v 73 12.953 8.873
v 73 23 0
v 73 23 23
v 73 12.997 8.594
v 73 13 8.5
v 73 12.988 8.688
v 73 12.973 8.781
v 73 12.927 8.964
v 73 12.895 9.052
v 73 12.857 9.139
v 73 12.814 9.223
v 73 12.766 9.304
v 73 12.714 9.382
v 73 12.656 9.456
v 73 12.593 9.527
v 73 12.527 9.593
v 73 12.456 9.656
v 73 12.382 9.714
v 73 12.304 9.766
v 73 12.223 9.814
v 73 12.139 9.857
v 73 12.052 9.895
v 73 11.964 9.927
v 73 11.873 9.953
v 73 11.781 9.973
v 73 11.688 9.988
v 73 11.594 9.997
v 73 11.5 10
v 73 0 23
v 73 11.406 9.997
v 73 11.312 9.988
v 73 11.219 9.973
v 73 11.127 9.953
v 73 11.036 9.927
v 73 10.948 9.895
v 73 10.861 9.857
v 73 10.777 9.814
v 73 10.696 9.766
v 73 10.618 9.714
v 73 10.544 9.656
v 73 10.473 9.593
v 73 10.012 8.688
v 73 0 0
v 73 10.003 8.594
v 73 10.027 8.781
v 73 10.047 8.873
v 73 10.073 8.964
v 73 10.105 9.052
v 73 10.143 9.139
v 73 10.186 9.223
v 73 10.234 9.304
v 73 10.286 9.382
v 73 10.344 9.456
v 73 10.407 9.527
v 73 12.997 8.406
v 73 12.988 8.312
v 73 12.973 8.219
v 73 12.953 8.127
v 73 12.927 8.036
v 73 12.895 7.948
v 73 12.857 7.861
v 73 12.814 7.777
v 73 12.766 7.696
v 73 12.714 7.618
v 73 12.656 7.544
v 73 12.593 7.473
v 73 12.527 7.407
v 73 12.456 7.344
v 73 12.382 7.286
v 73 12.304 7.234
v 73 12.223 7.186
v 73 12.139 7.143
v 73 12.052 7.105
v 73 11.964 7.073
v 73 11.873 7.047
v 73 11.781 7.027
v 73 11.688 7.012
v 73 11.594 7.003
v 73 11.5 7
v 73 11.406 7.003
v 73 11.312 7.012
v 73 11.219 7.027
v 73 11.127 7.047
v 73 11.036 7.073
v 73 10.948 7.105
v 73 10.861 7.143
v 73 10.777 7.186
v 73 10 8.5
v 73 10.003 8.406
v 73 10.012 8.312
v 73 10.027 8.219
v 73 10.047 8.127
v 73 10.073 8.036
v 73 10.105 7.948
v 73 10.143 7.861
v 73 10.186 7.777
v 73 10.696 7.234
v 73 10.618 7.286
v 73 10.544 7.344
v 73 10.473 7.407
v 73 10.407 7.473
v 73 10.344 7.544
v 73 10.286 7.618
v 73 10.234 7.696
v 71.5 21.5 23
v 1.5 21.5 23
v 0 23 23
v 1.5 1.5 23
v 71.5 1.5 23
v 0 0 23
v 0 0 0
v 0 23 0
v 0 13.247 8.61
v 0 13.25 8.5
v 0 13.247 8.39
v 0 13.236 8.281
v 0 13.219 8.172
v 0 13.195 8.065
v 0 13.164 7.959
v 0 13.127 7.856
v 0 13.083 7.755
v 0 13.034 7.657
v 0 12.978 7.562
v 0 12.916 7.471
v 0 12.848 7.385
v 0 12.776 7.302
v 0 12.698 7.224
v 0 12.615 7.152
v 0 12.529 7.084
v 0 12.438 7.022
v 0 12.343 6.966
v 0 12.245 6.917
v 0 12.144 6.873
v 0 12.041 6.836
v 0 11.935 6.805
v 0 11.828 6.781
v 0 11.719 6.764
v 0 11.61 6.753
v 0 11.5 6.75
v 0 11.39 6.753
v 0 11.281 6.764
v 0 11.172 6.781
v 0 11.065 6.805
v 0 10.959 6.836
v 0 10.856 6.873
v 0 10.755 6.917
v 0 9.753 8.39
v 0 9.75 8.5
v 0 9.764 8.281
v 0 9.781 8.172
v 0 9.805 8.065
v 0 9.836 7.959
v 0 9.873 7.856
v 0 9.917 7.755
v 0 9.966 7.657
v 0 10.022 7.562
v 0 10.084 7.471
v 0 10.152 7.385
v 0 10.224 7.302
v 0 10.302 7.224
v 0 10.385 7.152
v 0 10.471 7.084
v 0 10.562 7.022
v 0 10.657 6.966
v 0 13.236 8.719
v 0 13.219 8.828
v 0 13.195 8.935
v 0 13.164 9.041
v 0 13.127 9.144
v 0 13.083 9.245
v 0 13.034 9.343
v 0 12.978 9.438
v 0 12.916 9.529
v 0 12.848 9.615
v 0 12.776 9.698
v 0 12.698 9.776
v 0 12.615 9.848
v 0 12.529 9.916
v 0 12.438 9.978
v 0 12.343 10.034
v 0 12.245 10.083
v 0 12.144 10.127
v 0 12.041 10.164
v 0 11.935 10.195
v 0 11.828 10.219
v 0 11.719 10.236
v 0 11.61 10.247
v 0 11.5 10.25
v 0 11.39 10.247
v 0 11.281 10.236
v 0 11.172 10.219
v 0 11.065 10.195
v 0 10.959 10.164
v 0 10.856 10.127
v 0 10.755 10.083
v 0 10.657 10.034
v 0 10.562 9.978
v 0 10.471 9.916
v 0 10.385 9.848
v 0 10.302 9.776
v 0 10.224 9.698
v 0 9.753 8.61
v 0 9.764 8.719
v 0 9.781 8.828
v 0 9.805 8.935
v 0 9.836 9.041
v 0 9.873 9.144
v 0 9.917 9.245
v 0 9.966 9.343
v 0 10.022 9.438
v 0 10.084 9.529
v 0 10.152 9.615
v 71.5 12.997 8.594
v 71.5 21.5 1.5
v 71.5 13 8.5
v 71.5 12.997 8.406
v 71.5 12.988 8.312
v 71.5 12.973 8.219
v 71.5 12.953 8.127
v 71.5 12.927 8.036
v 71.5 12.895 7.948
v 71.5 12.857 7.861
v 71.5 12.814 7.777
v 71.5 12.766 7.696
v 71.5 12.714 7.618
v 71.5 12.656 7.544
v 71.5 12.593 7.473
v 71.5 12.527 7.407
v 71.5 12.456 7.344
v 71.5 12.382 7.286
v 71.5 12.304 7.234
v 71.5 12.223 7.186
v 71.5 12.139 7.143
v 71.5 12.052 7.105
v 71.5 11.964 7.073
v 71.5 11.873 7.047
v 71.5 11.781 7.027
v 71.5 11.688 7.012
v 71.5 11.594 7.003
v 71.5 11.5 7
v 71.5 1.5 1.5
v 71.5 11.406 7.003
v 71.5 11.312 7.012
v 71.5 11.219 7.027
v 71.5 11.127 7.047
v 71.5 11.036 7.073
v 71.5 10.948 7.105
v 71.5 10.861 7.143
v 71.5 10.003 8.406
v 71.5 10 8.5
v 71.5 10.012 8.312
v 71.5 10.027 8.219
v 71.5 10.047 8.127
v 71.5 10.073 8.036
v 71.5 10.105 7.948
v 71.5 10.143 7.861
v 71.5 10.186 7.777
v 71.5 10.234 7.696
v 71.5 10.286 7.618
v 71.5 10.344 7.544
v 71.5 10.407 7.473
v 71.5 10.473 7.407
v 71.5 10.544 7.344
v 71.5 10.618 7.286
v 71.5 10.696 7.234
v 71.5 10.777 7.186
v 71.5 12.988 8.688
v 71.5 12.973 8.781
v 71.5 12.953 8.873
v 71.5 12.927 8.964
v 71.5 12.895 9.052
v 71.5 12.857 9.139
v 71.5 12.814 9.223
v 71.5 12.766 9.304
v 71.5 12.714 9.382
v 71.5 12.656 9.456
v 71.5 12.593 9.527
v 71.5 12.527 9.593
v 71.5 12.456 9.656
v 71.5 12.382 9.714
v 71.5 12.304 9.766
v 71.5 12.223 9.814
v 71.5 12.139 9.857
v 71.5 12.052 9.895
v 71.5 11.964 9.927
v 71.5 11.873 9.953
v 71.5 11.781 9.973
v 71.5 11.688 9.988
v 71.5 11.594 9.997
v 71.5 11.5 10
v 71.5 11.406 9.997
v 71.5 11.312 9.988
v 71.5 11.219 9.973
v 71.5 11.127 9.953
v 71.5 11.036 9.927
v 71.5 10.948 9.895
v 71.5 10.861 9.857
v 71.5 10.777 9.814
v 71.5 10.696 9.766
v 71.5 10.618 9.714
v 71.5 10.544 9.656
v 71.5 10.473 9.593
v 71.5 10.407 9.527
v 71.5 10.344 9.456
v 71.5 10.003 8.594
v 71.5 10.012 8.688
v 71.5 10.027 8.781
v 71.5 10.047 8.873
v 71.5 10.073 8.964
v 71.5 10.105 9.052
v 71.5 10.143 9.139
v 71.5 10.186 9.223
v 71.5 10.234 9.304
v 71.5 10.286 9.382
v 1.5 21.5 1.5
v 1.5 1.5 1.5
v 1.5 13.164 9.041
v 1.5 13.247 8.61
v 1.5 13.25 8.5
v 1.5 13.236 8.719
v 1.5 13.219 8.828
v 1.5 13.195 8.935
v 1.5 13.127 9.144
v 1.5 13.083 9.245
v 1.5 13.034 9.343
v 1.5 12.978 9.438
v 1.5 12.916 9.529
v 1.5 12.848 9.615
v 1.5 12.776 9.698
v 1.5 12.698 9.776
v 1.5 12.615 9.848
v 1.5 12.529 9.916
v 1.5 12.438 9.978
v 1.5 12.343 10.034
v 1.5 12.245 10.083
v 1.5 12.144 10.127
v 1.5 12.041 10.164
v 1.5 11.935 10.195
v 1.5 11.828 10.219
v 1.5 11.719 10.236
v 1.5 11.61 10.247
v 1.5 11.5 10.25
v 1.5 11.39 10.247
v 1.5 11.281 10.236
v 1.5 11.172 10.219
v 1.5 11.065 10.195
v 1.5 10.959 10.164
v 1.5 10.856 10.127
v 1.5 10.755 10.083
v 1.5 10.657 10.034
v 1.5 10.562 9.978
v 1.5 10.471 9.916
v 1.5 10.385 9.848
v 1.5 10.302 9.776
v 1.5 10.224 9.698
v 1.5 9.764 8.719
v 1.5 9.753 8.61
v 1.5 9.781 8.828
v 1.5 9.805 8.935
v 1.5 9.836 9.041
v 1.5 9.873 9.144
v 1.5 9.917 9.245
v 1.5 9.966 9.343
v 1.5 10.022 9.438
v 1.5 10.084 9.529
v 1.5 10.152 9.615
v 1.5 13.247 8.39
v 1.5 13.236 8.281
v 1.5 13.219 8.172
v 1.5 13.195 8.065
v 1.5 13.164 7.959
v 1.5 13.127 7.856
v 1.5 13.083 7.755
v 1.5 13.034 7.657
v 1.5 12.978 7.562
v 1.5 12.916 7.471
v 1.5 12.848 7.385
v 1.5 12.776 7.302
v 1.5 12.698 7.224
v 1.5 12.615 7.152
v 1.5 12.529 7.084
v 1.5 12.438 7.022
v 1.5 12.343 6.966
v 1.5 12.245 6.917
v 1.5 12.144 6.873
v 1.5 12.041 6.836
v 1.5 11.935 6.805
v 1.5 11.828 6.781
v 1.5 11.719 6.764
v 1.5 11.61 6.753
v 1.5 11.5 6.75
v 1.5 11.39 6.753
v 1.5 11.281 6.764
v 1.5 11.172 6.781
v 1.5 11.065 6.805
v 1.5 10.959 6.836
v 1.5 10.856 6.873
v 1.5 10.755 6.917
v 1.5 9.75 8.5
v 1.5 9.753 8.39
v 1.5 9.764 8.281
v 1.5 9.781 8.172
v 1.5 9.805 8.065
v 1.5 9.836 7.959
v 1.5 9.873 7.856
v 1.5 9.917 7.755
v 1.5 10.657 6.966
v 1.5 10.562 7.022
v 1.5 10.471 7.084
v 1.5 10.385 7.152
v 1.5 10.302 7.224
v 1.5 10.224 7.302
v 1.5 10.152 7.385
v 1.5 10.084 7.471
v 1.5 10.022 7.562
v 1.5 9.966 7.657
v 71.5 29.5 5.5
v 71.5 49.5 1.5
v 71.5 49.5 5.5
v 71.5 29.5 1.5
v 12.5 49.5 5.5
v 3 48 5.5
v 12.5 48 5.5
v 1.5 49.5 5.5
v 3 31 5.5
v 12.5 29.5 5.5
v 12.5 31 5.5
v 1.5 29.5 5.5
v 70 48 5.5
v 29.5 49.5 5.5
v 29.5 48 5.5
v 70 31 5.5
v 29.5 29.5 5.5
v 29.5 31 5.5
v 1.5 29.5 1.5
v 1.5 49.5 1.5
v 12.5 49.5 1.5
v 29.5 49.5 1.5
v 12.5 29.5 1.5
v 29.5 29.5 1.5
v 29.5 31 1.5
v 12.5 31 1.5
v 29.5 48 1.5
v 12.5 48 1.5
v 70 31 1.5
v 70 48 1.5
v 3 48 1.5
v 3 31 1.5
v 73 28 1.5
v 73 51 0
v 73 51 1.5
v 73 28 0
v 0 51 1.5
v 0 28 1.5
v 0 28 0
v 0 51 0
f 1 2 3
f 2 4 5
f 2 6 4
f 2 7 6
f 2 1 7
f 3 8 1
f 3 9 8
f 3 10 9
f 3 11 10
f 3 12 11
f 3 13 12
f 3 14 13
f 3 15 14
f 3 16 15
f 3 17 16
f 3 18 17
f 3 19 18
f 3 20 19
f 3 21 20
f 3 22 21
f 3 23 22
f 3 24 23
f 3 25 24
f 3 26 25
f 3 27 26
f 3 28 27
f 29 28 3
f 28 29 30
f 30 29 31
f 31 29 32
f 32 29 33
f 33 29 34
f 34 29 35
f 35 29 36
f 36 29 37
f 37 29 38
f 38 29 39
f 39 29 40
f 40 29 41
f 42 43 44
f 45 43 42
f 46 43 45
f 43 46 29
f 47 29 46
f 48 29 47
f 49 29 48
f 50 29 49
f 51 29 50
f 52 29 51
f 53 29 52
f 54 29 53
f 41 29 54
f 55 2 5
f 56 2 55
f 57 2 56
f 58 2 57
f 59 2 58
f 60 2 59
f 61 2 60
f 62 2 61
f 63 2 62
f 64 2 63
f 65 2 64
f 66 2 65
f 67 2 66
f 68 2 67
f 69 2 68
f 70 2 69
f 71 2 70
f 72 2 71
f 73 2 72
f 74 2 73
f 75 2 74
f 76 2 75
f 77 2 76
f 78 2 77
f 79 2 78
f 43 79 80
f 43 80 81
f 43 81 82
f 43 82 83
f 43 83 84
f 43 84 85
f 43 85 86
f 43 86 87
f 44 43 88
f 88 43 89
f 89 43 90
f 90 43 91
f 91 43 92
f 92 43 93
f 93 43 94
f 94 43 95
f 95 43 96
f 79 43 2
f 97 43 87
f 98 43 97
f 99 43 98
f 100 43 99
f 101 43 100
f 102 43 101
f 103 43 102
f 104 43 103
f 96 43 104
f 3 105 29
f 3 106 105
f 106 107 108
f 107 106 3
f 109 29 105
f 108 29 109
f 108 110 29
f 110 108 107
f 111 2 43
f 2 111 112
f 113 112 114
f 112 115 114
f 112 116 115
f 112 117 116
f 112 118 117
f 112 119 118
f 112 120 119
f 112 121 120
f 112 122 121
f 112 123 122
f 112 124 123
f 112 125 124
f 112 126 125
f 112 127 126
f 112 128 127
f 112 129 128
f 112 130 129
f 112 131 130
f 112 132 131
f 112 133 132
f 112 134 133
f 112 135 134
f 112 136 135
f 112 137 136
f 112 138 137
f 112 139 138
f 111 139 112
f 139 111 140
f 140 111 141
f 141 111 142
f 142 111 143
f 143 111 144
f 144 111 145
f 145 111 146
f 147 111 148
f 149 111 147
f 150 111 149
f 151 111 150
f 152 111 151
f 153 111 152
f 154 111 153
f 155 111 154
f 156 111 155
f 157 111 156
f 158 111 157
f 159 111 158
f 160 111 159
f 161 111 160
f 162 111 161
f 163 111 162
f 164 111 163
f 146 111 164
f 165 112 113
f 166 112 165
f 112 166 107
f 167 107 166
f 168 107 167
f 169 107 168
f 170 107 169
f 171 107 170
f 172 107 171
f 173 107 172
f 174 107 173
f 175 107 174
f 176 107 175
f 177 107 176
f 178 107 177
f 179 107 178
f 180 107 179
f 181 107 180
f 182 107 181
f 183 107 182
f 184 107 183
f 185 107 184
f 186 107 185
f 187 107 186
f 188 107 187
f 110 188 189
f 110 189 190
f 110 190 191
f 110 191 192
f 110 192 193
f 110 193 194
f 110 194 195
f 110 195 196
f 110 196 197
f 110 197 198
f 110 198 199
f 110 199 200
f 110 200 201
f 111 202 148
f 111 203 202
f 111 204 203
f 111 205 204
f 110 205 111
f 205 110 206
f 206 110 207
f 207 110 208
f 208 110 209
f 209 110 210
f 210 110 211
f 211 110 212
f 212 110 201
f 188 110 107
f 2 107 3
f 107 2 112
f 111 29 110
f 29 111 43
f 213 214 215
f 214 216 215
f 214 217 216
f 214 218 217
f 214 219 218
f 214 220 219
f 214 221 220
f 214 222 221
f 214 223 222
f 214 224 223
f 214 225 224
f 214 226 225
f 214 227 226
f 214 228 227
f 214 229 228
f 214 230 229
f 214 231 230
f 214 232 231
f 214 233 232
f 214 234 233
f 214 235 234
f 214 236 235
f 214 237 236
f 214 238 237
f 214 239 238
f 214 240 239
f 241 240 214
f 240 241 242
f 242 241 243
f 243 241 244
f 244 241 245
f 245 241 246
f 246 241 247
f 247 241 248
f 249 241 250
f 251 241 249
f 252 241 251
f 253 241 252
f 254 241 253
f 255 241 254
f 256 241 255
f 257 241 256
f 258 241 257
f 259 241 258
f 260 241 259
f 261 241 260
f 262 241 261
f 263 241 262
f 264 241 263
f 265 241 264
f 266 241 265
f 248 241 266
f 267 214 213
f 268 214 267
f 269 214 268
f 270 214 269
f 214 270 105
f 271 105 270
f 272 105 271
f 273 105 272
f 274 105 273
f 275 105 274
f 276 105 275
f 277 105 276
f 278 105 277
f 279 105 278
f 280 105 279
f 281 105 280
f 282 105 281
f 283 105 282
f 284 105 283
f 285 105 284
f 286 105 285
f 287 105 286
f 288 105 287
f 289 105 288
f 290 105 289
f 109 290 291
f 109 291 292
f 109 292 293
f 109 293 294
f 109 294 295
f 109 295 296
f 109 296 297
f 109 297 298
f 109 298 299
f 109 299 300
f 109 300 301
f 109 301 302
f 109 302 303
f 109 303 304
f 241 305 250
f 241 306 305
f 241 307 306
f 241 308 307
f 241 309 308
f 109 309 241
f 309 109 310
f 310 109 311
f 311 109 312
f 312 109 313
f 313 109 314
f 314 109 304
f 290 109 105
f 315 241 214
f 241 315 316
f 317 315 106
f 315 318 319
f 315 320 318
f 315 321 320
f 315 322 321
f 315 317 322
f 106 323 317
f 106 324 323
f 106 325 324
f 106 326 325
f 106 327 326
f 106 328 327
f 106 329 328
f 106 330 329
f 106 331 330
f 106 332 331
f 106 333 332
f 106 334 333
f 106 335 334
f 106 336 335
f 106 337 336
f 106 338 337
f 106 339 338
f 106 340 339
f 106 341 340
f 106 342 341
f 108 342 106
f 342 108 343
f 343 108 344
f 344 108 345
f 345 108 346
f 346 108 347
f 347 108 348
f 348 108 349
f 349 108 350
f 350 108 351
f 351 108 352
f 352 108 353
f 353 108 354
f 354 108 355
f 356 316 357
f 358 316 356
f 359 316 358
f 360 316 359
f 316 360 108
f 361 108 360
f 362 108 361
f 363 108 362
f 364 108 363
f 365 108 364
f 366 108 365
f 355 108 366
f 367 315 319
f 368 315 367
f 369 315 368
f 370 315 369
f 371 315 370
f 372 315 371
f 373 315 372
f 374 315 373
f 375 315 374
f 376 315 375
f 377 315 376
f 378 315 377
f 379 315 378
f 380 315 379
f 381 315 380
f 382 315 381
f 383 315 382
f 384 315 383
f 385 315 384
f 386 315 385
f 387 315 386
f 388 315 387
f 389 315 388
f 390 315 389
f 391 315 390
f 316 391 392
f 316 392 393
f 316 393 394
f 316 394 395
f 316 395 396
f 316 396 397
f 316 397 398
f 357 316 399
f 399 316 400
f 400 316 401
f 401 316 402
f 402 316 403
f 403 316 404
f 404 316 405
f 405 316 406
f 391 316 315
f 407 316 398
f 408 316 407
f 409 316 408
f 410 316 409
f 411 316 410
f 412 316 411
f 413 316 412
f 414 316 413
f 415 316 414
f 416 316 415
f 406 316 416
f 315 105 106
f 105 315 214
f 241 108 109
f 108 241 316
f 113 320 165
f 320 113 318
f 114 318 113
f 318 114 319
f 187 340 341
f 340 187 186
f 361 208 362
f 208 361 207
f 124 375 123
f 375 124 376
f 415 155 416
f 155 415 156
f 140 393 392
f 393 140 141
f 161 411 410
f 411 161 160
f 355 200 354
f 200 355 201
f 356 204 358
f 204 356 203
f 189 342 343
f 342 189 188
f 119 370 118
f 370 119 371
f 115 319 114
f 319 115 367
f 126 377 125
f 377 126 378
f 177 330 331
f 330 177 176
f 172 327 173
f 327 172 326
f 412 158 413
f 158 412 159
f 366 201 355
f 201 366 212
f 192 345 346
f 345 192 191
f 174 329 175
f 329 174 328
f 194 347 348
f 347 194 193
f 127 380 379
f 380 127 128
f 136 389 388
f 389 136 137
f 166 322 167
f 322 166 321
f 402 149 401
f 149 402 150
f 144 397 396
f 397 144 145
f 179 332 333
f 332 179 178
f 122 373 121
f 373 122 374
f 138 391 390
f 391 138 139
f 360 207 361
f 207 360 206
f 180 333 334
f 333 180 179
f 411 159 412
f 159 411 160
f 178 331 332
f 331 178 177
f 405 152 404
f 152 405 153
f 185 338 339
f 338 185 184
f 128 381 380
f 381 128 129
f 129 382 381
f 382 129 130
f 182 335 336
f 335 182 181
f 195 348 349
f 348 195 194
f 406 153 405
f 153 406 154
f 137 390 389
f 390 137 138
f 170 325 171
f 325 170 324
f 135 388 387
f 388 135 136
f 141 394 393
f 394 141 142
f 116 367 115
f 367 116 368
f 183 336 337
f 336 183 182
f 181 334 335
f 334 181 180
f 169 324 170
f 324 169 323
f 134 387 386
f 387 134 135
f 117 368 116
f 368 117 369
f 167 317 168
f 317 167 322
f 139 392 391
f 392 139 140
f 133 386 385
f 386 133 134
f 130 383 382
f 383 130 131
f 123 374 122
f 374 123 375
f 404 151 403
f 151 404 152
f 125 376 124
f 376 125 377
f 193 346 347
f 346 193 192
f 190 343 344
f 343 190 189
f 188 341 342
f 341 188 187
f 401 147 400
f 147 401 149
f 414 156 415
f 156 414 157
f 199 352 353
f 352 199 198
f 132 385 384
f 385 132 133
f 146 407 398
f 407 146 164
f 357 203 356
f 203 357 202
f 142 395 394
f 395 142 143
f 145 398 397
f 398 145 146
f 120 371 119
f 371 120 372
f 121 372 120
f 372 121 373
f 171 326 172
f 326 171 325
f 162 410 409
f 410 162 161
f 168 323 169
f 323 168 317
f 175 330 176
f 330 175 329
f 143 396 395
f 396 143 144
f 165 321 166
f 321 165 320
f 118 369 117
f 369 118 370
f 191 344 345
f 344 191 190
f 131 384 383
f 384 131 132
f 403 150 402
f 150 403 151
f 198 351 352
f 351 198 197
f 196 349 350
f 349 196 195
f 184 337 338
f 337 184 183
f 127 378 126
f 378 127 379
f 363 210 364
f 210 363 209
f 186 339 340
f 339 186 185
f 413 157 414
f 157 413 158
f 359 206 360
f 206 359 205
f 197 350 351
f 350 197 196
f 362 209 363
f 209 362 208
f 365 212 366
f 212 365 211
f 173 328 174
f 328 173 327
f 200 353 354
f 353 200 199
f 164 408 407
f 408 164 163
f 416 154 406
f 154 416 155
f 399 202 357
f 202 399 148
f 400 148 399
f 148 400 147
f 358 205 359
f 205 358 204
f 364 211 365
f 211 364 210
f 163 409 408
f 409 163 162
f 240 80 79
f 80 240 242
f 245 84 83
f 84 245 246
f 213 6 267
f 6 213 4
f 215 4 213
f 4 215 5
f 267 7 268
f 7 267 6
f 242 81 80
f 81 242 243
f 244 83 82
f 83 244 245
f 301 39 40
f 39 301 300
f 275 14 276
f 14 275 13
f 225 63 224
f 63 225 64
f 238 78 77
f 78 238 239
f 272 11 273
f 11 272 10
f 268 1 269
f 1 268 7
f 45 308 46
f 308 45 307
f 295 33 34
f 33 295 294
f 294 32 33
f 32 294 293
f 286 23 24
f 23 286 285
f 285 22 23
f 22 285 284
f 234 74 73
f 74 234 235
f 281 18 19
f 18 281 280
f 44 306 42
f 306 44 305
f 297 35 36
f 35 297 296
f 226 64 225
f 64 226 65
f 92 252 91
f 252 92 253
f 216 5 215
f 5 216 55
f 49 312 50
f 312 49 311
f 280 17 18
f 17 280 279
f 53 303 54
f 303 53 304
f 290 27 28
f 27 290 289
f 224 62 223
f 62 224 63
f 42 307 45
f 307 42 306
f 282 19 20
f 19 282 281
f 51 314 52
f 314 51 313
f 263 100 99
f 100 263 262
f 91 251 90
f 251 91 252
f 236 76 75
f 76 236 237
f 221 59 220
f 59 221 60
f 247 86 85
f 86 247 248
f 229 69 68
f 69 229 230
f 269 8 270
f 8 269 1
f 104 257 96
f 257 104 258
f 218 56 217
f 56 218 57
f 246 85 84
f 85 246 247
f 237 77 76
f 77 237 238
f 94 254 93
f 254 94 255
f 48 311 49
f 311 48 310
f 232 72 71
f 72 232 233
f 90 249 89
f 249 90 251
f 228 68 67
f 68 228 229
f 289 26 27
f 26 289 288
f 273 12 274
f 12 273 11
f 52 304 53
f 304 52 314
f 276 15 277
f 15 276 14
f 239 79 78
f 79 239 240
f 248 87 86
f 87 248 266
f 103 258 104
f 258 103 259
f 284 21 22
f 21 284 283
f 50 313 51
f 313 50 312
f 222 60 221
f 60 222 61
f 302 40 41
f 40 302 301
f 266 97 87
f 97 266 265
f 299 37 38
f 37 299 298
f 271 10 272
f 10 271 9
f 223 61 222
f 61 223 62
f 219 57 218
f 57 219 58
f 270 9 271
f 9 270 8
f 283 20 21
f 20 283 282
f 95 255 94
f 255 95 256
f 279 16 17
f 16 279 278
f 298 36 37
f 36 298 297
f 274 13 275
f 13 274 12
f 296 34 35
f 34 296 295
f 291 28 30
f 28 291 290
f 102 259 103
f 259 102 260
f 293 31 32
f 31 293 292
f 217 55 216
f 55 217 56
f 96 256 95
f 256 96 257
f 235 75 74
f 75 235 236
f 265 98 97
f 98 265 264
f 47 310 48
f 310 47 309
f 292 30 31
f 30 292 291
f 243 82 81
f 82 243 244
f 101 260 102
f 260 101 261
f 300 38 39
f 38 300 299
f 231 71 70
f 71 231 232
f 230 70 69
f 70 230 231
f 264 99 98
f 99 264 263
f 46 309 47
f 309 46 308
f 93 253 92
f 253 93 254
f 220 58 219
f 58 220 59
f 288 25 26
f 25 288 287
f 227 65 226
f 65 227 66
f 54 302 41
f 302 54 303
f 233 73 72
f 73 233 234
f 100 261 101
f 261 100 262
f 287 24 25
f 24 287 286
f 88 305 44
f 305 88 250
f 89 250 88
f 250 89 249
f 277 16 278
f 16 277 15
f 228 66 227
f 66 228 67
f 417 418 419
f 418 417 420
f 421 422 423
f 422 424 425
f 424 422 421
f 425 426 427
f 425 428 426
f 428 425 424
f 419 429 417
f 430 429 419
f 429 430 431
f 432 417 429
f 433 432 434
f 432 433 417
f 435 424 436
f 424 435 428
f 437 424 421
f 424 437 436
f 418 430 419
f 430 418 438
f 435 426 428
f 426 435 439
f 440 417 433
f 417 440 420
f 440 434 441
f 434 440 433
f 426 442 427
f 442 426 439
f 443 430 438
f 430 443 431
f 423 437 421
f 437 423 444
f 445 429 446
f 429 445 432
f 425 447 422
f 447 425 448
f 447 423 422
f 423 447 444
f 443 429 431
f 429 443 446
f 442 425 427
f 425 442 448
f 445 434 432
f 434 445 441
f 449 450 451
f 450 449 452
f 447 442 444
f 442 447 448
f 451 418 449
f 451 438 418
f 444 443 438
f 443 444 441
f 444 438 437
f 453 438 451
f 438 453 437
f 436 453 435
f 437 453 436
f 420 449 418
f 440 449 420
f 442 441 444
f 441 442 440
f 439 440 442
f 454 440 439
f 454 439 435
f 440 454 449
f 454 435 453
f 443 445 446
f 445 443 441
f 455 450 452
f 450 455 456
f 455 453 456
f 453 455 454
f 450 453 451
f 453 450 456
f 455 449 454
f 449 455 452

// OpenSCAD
wall_width = 1.5;
// inner volume sie
depth = 70;
width = 20;
height = 20;

hole1_size = 1.75;
hole2_size = 1.5;

cover_depth = 3 + wall_width;
relay_off_x = 11 + wall_width;
relay_cut = 17;

difference() {
    cube([depth + wall_width * 2, width + wall_width * 2, height + wall_width * 2]);

    translate([wall_width, wall_width, wall_width])
        cube([depth,width,height + wall_width * 2]);
    translate([-wall_width, width/2 + wall_width, wall_width + 7])
        rotate([90, 0, 90])
            cylinder(h=wall_width * 3,r=hole1_size,$fn=100);
    translate([depth, wall_width + width/2, wall_width + 7])
        rotate([90, 0, 90])
            cylinder(h=wall_width * 3,r=hole2_size,$fn=100);
}
translate([0, width + wall_width * 2 + 5]) {
    union() {
        cube([depth + wall_width * 2, width + wall_width * 2, wall_width]);
        difference() {
            translate([wall_width, wall_width, 0.5])
                cube([depth, width, cover_depth + 0.5]);

            translate([relay_off_x, 0, 0])
                cube([relay_cut, wall_width * 3, cover_depth + 2]);

            translate([relay_off_x, width - wall_width, 0])
                cube([relay_cut, wall_width * 3, cover_depth + 2]);
    
            translate([wall_width * 2, wall_width * 2, wall_width / 2])
                cube([depth - wall_width * 2, width - wall_width * 2, cover_depth + 1]);
        }
    }
}
